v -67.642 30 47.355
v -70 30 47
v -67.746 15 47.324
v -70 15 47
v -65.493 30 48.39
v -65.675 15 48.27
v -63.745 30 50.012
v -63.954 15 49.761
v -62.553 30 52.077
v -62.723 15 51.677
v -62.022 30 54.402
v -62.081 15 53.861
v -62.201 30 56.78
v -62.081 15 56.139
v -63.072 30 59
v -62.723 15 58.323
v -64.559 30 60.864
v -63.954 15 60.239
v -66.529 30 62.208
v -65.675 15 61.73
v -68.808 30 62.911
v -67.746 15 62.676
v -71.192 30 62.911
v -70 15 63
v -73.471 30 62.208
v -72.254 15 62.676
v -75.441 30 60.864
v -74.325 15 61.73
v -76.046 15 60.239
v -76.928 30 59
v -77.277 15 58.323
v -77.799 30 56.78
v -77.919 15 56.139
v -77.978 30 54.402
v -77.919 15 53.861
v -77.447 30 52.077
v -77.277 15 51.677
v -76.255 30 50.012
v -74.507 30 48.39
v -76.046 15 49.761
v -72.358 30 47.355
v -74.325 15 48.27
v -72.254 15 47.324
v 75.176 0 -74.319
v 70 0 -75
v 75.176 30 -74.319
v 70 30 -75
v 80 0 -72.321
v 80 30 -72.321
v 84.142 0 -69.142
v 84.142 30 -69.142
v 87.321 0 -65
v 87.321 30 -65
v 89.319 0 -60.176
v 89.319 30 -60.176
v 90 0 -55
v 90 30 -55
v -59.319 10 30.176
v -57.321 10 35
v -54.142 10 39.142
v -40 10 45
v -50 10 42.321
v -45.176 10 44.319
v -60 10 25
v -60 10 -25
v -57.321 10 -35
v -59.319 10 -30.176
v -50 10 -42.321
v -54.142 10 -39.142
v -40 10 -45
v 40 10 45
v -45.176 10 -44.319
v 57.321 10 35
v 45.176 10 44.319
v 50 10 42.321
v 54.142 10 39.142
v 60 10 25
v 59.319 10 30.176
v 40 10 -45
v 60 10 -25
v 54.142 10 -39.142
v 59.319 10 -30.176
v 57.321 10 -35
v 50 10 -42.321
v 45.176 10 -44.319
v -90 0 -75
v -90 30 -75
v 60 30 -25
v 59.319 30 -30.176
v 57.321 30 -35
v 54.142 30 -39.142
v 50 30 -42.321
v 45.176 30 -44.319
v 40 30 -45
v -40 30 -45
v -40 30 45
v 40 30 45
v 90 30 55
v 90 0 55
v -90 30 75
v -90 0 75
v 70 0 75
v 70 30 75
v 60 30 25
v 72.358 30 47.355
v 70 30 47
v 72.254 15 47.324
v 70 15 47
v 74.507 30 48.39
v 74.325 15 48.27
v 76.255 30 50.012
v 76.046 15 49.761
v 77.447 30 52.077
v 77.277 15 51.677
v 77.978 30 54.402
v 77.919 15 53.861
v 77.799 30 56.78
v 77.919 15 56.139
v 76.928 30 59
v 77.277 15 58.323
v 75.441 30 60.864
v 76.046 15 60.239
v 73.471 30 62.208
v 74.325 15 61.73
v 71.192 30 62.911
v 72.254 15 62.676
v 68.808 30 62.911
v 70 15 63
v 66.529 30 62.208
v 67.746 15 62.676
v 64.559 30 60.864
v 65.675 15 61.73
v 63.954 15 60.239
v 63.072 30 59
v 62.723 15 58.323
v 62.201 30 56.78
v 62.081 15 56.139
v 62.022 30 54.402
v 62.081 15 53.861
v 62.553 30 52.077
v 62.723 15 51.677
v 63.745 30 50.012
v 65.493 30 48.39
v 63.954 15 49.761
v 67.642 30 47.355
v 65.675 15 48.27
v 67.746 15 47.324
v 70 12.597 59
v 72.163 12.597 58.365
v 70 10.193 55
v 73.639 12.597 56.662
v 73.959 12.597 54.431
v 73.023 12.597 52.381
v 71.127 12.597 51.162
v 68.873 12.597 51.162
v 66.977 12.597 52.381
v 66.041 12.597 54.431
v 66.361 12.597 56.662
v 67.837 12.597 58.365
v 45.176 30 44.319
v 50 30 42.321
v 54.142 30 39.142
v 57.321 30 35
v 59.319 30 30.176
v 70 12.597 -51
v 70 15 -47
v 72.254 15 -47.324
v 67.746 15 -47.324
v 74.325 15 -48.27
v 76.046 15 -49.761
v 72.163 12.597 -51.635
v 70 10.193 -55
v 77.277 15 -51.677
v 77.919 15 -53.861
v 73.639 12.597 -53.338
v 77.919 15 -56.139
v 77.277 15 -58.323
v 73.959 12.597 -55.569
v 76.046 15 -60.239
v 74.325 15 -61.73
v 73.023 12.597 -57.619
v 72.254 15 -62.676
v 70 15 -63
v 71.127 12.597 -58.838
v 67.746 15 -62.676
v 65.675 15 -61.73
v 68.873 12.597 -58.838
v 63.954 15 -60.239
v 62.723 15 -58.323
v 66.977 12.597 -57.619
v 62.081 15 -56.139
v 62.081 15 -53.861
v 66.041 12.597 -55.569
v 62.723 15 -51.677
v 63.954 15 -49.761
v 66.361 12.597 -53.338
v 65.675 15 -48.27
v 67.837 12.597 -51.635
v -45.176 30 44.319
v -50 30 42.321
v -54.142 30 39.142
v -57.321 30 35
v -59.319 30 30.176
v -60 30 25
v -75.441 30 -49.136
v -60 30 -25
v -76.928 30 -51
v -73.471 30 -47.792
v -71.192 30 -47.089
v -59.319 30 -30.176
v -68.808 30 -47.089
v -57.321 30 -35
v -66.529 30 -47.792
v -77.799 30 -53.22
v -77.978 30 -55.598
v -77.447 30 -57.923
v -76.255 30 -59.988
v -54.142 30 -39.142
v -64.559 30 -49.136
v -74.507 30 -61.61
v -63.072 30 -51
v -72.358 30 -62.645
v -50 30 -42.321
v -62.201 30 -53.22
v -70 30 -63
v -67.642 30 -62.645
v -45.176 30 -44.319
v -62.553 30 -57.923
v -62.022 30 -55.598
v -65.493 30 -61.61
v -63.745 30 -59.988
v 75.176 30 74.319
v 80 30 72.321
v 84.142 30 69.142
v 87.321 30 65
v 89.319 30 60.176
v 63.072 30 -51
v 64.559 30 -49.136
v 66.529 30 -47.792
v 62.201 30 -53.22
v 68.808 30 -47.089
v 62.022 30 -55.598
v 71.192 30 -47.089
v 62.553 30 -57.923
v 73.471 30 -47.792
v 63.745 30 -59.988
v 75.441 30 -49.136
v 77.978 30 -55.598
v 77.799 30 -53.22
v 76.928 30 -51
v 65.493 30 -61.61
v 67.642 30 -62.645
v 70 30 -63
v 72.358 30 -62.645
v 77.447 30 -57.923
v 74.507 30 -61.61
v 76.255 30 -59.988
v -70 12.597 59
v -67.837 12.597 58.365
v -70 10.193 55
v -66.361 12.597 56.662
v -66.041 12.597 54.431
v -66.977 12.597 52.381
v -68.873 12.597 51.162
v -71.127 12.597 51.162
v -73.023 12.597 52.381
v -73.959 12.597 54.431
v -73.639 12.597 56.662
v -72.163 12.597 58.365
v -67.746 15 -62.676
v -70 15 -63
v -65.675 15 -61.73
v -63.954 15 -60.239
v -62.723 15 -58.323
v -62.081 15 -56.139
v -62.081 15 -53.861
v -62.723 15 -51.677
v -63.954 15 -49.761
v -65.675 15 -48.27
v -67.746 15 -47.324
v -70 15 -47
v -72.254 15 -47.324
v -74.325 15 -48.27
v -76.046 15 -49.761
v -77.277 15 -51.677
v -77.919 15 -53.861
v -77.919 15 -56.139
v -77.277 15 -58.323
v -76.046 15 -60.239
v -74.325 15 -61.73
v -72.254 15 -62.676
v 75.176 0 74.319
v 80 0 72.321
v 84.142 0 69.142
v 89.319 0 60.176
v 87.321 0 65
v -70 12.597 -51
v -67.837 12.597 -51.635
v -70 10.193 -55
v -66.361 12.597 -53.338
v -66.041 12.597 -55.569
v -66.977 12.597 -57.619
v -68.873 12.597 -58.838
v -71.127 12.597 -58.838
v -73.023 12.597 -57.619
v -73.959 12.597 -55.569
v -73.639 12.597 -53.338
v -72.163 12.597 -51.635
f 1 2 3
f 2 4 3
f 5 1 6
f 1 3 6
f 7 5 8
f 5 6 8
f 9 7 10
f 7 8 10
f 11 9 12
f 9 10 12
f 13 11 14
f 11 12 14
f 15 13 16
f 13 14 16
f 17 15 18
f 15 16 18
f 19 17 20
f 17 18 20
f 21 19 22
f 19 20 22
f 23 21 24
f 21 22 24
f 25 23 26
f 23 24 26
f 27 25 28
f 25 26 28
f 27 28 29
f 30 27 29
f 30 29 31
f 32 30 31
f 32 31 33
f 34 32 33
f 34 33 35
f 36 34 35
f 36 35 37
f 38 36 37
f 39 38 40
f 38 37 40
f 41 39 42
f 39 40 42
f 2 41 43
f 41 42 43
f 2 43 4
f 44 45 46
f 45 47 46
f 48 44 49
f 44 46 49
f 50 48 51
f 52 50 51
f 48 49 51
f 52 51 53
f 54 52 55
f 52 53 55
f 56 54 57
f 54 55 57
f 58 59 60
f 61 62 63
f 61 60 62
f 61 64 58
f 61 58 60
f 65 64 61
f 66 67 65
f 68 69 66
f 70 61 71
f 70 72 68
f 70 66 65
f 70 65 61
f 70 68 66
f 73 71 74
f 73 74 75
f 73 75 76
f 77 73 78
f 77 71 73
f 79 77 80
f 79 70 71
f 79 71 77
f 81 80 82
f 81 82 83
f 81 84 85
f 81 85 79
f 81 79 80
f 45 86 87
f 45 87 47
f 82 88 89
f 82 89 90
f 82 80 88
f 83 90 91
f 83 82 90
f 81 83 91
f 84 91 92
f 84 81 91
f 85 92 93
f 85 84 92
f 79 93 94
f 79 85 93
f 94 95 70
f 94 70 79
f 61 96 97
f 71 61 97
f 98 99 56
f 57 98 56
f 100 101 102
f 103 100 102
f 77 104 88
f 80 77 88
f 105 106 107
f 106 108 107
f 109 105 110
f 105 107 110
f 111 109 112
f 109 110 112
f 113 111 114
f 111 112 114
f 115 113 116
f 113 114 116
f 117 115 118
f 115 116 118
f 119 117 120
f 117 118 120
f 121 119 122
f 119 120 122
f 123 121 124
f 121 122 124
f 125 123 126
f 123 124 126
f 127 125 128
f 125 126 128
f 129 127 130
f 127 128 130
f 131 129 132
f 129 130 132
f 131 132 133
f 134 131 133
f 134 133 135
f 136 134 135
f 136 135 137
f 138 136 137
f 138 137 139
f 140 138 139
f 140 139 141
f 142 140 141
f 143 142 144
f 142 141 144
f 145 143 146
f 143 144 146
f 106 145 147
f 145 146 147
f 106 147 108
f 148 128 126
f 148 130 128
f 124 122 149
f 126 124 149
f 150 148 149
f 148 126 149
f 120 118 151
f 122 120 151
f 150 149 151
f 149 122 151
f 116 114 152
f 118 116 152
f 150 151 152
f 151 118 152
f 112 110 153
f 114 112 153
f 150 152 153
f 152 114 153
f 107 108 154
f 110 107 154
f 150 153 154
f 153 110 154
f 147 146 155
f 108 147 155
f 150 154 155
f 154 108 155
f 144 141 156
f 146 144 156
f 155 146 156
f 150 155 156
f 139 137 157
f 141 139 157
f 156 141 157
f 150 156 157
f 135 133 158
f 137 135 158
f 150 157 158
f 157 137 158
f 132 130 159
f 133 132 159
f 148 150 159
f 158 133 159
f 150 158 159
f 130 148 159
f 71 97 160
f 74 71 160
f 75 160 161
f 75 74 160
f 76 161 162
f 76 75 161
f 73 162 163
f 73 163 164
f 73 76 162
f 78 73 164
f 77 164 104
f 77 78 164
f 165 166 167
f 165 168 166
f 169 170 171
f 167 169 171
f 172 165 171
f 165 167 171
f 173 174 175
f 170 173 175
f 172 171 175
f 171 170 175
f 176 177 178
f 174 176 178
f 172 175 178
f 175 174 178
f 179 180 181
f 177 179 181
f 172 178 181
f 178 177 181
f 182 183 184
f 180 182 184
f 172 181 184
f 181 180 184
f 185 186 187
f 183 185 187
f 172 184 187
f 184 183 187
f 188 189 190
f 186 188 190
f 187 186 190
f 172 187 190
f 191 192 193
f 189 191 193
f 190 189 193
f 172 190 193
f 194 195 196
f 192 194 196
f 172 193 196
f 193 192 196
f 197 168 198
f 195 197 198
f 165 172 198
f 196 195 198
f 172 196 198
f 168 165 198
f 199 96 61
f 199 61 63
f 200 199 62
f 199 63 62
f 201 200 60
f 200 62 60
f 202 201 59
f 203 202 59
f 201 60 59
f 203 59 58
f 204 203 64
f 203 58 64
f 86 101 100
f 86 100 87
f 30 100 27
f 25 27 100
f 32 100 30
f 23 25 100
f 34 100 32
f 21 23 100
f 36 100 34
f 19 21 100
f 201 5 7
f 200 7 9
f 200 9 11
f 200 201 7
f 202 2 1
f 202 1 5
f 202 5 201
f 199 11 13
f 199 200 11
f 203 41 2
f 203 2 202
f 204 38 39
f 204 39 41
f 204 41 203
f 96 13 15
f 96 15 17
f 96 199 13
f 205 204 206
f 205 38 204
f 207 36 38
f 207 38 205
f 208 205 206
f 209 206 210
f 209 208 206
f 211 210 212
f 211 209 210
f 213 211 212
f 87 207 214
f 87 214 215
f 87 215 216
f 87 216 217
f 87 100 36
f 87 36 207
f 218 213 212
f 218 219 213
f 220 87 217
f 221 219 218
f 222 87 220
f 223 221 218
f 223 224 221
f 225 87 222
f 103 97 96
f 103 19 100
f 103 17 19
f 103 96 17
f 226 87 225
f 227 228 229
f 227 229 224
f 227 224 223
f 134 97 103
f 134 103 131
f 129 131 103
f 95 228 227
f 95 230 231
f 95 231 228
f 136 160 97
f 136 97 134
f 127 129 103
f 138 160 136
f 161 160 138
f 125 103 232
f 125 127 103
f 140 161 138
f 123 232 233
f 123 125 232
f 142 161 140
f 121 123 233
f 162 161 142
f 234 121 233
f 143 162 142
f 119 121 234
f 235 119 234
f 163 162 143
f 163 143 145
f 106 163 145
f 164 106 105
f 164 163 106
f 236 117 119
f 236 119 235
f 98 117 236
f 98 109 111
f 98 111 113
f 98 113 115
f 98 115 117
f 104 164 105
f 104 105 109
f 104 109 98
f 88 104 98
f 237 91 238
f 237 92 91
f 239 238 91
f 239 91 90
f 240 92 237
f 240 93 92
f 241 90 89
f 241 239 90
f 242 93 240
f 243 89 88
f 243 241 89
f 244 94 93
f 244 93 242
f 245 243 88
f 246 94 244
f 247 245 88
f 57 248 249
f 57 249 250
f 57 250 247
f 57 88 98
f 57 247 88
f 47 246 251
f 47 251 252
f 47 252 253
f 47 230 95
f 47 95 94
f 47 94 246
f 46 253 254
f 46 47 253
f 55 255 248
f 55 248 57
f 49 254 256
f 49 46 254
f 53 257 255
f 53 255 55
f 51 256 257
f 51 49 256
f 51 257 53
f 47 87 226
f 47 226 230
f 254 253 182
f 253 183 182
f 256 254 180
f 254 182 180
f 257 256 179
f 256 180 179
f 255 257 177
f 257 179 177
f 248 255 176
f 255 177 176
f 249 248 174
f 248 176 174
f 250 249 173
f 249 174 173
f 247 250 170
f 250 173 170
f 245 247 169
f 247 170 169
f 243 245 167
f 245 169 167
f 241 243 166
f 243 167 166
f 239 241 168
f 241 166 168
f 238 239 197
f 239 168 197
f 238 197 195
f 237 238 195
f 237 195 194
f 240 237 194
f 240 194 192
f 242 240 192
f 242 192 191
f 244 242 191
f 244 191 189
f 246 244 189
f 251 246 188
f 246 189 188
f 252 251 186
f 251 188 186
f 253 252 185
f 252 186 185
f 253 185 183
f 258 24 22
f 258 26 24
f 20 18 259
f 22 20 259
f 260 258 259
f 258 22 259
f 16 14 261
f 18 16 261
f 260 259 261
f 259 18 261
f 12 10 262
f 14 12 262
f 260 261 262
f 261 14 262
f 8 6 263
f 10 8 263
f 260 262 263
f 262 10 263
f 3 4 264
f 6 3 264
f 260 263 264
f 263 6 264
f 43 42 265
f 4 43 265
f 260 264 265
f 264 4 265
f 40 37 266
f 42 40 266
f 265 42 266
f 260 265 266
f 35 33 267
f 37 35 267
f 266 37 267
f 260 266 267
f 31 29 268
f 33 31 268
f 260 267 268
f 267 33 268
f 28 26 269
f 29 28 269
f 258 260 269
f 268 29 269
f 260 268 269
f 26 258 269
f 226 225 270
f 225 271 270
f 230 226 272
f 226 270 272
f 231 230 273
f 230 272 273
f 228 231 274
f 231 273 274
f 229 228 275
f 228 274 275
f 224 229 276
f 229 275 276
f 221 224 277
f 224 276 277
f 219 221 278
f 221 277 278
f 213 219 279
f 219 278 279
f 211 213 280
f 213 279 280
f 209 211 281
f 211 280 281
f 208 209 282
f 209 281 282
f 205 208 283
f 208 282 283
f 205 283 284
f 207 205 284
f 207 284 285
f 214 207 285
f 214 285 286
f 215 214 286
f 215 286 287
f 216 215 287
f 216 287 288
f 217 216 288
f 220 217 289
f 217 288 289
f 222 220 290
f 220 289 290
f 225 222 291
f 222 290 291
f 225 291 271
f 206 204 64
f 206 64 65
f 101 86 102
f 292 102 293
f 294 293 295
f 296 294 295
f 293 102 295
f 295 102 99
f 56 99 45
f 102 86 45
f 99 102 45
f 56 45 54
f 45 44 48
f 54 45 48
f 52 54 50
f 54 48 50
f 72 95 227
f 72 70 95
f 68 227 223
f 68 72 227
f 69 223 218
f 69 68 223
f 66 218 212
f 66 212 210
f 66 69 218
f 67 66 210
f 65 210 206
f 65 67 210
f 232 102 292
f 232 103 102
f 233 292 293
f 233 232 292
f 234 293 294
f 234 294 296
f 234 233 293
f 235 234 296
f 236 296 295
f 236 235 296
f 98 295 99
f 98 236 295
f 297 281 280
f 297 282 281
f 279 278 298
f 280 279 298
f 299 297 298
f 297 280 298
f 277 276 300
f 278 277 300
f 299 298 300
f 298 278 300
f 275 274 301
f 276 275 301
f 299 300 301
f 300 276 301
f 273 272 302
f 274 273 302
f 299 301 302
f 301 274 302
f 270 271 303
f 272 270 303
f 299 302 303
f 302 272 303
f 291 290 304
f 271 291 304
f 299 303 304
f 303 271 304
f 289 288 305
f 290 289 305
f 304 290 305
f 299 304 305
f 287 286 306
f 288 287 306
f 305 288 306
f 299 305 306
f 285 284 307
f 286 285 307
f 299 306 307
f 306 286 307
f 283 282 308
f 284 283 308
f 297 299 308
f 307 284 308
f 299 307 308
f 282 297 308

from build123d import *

# Parameters (mm, degrees)
SKETCH1_W                  = 180
SKETCH1_H                  = 150
BOSS_EXTRUDE1_DEPTH        = 30
F_16_0MM_DOWEL_HOLE1_D     = 16
F_16_0MM_DOWEL_HOLE1_DEPTH = 15
F_16_0MM_DOWEL_HOLE1_TIP   = 4.806884952
SKETCH5_W                  = 120
SKETCH5_H                  = 90
CUT_EXTRUDE1_DEPTH         = 20
FILLET1_R                  = 20
FILLET2_R                  = 20


with BuildPart() as part:
    # Sketch1 → Boss-Extrude1 (new body)
    with BuildSketch(Plane(origin=(0, 0, 0), x_dir=(1, 0, 0), z_dir=(0, 1, 0))):
        Rectangle(SKETCH1_W, SKETCH1_H)
    extrude(amount=BOSS_EXTRUDE1_DEPTH)

    # Ø16.0mm Dowel Hole1
    with Locations(Plane(origin=(-70, 30, 55), x_dir=(0, 0, 1), z_dir=(0, 1, 0))):
        with Locations((0, 0), (-110, 0), (-110, 140), (0, 140)):
            Hole(F_16_0MM_DOWEL_HOLE1_D / 2, depth=F_16_0MM_DOWEL_HOLE1_DEPTH)
            with Locations((0, 0, -(F_16_0MM_DOWEL_HOLE1_DEPTH + F_16_0MM_DOWEL_HOLE1_TIP / 2))):  # 118° drill point
                Cone(0, F_16_0MM_DOWEL_HOLE1_D / 2, F_16_0MM_DOWEL_HOLE1_TIP, mode=Mode.SUBTRACT)

    # Sketch5 → Cut-Extrude1 (cut)
    with BuildSketch(Plane(origin=(0, 30, 0), x_dir=(1, 0, 0), z_dir=(0, 1, 0))):
        Rectangle(SKETCH5_W, SKETCH5_H)
    extrude(amount=-CUT_EXTRUDE1_DEPTH, mode=Mode.SUBTRACT)

    # Fillet1
    fillet1_edges = [part.edges().sort_by_distance(p)[0] for p in [
        (60, 20, -45),
        (-60, 20, -45),
        (-60, 20, 45),
        (60, 20, 45),
    ]]
    fillet(fillet1_edges, radius=FILLET1_R)

    # Fillet2
    fillet2_edges = [part.edges().sort_by_distance(p)[0] for p in [
        (90, 15, 75),
        (90, 15, -75),
    ]]
    fillet(fillet2_edges, radius=FILLET2_R)


solid = part.part
